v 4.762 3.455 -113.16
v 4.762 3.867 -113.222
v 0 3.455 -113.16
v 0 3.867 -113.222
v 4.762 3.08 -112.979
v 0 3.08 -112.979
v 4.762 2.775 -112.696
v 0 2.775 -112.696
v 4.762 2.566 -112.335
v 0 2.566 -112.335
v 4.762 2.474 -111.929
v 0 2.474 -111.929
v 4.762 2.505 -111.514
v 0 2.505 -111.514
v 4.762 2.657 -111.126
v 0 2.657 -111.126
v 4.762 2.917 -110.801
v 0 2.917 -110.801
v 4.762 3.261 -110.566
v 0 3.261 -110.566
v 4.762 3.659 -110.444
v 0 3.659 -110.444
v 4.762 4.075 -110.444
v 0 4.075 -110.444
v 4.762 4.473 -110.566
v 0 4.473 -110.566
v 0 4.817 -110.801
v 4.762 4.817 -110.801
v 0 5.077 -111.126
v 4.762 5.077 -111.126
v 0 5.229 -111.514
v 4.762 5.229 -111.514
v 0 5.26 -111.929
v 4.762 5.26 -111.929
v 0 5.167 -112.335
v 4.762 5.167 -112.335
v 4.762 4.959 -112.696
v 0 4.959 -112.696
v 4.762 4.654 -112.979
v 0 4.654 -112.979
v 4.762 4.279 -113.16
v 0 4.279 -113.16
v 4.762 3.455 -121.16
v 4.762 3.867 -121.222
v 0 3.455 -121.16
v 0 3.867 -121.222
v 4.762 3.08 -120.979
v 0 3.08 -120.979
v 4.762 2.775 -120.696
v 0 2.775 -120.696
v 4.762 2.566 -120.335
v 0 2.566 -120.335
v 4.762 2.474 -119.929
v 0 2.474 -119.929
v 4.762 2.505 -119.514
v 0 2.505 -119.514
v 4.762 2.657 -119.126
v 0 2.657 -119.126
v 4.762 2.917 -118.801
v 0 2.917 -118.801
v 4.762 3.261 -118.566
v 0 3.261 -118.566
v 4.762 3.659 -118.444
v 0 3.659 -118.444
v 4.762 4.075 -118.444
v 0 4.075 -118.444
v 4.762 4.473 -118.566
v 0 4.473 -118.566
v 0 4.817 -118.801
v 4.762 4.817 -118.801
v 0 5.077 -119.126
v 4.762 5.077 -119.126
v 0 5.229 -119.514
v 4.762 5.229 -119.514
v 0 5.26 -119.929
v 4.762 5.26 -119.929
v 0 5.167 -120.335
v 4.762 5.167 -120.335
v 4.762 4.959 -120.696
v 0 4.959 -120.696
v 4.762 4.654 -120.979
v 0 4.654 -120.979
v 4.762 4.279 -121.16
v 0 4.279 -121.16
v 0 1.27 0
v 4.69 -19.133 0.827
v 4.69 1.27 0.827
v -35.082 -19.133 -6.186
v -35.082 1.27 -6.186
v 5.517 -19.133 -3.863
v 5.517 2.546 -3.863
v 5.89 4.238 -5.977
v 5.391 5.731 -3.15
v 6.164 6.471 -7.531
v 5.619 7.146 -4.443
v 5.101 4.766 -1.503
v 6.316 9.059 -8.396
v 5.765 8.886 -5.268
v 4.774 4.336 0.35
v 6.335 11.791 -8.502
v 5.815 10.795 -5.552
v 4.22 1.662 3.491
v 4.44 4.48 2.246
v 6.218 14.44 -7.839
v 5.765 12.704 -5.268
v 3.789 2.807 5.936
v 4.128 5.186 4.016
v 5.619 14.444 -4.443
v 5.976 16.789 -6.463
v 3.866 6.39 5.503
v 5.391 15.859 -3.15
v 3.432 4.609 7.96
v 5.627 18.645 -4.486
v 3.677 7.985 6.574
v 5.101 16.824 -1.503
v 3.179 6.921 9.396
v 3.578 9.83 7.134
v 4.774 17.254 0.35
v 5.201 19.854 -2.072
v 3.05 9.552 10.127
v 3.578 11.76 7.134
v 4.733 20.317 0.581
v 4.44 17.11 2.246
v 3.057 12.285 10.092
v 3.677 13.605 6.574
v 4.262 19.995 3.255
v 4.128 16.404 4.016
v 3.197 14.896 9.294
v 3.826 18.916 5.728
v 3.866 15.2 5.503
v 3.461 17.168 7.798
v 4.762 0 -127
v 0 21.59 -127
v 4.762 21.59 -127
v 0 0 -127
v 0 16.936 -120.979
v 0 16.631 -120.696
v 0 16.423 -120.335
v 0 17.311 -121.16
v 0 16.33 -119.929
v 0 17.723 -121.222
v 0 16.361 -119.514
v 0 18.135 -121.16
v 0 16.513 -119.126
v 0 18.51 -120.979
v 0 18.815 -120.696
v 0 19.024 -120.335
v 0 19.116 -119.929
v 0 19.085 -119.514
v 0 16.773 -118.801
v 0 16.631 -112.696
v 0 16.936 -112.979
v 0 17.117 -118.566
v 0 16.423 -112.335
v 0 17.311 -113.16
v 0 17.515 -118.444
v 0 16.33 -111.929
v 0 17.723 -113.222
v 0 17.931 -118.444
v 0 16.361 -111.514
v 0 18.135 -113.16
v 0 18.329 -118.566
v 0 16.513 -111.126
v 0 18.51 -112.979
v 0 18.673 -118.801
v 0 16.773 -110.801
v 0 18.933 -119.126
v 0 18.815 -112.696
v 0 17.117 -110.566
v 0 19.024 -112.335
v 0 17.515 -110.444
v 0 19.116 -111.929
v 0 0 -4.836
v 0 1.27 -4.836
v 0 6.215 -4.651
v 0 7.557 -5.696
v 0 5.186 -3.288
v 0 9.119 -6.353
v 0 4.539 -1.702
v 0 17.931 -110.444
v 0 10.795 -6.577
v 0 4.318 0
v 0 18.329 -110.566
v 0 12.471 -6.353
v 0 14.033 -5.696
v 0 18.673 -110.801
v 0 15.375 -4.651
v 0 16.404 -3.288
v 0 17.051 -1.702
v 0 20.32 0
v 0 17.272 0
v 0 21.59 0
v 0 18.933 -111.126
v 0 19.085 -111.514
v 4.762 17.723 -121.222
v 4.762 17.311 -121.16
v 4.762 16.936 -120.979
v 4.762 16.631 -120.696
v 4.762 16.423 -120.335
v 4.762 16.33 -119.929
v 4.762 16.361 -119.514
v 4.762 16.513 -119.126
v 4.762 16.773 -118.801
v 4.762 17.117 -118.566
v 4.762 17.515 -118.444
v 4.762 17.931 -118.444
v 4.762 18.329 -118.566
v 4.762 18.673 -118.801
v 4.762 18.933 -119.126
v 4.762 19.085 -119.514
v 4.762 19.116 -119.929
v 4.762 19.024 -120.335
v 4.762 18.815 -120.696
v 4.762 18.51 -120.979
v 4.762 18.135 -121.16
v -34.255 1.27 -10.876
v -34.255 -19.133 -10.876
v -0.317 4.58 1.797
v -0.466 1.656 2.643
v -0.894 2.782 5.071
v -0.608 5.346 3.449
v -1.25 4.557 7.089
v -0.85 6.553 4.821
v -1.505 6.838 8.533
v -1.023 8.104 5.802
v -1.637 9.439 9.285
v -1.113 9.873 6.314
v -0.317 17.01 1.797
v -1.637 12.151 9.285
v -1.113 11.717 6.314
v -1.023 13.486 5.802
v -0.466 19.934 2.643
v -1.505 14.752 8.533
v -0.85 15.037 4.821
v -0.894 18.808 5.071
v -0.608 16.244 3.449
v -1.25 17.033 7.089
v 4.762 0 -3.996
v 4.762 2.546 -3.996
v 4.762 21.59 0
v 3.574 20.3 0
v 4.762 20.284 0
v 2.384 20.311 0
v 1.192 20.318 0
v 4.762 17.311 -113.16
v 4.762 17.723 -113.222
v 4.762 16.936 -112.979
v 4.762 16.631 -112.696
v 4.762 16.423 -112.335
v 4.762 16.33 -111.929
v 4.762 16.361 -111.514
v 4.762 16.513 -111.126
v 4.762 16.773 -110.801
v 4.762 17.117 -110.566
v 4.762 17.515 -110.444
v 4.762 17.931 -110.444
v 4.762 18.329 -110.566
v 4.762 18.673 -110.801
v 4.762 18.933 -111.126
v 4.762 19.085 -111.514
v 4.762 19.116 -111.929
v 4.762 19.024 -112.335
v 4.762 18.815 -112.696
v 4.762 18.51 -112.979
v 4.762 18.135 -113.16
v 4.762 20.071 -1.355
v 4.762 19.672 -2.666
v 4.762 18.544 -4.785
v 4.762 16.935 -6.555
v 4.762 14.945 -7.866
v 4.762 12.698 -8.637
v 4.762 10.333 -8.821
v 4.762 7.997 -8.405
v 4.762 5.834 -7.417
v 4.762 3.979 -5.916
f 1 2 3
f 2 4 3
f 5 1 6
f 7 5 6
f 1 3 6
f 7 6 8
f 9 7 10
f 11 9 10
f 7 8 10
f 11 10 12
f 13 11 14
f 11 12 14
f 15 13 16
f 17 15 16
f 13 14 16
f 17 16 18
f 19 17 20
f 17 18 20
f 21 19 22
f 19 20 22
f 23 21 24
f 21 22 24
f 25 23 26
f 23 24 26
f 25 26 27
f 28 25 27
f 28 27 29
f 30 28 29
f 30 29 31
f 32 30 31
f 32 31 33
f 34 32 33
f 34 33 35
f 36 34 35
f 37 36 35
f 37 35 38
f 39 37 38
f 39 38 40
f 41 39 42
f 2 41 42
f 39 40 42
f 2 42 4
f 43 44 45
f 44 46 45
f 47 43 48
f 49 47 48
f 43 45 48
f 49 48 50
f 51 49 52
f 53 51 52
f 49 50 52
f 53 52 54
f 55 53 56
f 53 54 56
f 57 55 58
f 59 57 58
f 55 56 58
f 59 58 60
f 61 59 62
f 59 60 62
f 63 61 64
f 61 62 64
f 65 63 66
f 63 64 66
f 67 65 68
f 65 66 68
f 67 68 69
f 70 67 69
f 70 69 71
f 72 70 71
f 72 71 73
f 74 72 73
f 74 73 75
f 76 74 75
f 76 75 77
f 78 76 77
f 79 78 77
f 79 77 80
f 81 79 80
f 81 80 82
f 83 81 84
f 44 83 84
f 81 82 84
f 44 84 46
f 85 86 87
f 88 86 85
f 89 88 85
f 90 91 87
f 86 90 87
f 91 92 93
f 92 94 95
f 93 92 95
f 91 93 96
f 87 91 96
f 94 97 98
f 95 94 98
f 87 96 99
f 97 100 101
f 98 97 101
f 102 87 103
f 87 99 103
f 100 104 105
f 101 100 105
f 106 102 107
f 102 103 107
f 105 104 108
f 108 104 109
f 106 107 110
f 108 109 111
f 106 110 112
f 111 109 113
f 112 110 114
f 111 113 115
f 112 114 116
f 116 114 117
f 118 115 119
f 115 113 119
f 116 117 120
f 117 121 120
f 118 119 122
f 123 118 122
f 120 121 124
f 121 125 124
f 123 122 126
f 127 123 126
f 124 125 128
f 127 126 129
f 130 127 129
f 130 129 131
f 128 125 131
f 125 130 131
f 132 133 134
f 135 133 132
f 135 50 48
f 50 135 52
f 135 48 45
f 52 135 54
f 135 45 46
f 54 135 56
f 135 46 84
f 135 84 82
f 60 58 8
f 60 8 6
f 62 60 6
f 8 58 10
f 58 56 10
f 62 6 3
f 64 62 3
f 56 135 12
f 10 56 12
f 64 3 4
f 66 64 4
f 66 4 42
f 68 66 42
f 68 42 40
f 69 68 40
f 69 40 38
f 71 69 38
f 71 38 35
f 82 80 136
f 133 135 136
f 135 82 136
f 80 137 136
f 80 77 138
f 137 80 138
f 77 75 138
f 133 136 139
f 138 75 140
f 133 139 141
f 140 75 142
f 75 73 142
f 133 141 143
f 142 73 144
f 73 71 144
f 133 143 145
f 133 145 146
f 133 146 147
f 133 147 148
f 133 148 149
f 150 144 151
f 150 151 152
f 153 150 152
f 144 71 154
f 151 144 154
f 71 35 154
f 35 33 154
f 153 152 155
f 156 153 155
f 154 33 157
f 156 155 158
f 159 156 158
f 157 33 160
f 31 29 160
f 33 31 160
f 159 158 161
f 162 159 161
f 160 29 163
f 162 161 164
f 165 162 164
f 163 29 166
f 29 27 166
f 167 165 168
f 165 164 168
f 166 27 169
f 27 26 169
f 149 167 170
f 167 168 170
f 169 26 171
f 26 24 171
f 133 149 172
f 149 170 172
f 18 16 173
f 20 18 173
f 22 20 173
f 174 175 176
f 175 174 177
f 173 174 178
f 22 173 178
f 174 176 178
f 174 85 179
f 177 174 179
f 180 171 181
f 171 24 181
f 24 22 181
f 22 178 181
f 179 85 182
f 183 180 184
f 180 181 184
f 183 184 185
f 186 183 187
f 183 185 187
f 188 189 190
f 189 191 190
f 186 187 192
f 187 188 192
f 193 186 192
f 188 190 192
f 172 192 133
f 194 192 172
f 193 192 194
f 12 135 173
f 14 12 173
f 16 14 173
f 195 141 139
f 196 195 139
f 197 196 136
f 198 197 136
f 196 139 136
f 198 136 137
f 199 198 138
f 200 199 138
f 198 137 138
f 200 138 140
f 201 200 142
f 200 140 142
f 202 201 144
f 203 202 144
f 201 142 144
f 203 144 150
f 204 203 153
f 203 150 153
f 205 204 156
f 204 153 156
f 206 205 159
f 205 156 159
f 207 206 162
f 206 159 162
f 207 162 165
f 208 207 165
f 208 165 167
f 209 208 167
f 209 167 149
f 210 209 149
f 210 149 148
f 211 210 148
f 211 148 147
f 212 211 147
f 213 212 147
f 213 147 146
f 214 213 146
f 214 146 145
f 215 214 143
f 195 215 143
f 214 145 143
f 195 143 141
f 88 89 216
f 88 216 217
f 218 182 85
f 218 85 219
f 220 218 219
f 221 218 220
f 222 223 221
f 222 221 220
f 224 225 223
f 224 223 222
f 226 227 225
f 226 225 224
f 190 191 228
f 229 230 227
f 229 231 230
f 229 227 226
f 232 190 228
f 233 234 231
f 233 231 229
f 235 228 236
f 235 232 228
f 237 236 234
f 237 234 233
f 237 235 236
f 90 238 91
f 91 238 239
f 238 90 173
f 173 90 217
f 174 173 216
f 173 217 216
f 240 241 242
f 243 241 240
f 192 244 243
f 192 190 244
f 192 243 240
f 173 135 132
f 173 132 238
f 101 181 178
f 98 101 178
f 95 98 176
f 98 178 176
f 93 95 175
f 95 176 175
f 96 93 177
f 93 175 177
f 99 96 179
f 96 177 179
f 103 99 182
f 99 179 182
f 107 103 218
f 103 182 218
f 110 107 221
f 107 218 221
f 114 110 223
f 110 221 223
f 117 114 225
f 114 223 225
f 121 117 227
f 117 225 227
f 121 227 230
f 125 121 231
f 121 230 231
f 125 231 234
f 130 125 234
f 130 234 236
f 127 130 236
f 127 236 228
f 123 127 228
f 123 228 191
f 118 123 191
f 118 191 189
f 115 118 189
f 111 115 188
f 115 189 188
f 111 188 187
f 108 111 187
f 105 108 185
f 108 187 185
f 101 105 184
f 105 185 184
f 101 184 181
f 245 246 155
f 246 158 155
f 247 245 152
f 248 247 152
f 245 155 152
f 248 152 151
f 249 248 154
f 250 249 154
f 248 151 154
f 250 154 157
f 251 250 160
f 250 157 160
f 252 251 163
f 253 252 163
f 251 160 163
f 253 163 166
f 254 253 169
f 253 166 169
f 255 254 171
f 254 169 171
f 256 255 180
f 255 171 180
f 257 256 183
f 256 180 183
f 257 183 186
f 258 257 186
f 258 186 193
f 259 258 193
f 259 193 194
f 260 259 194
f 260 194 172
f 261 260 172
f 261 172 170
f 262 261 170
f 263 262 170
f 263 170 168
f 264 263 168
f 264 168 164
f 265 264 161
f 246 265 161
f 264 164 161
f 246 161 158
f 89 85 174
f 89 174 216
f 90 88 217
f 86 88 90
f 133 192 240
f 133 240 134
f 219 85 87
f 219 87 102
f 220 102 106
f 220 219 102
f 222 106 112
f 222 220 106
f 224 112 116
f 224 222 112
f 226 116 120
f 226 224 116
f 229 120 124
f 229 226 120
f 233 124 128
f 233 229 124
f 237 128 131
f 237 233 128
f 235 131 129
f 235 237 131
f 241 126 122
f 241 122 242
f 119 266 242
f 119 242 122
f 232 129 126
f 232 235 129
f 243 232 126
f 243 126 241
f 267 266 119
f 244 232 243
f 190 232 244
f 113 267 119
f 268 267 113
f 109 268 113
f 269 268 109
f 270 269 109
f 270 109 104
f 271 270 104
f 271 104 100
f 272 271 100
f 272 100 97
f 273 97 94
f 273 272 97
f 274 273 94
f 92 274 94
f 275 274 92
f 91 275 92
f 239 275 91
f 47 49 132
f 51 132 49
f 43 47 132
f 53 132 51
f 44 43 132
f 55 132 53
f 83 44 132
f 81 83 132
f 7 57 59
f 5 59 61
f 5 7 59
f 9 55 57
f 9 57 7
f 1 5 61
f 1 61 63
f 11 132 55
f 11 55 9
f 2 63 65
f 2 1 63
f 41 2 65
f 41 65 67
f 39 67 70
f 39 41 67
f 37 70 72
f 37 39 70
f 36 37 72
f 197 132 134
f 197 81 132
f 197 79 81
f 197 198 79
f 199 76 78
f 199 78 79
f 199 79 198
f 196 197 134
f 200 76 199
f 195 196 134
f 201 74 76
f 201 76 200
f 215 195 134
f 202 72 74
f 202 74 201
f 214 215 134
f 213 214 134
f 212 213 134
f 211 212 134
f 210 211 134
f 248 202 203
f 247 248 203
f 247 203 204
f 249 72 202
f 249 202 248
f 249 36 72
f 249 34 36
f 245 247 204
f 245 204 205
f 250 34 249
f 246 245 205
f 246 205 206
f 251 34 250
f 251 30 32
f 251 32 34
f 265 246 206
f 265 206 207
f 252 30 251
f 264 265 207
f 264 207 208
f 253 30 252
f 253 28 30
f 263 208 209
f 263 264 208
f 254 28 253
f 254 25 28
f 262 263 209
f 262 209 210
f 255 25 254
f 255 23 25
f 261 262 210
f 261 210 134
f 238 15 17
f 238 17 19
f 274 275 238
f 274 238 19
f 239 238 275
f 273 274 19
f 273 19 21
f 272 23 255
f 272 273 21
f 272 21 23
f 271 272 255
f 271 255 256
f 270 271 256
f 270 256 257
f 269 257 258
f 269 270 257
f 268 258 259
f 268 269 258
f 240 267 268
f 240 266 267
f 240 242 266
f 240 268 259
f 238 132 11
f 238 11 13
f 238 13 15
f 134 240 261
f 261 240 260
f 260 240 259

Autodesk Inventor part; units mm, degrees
ref_plane "YZ Plane" through (0, 0, 0) normal (1, 0, 0) x (0, 1, 0)
ref_plane "XZ Plane" through (0, 0, 0) normal (0, 1, 0) x (-1, 0, 0)
ref_plane "XY Plane" through (0, 0, 0) normal (0, 0, 1) x (1, 0, 0)
sketch "Sketch1" plane through (0, 0, 0) normal (1, 0, 0) x (0, 1, 0)
  line L0 (0, 0) -> (21.59, 0)
  line L1 (21.59, 0) -> (21.59, -127)
  line L2 (21.59, -127) -> (0, -127)
  line L3 (0, -127) -> (0, 0)
  dimension "d0" = 21.59
  dimension "d1" = 127
extrude "Extrusion1" add sketch "Sketch1" along normal blind 4.7625
sketch "Sketch2" plane through (0, 21.59, 0) normal (0, 1, 0) x (1, 0, 0)
  line L0 (0, 0) -> (-3.2071, -18.1884)
  line L1 (0, 0) -> (18.469, 0) construction
  line L2 (0, 0) -> (13.0579, -2.3025)
  line L3 (0, 0) -> (13.2594, 0) construction
  dimension "d4" = 100
  dimension "d24" = 10
ref_plane "Work Plane1" through (0, 21.59, 0) normal (-0.9848078, 0, -0.1736482) x (-0.1736482, 0, 0.9848078)
sketch "Sketch3" plane through (0, 21.59, 0) normal (-0.9848078, 0, -0.1736482) x (-0.1736482, 0, 0.9848078)
  line L0 (-0.827, 0) -> (-0.827, -21.59) projected
  line L1 (-0.827, -21.59) -> (-125.8976, -21.59) projected
  line L2 (-125.8976, -21.59) -> (-125.8976, 0) projected
  line L3 (-125.8976, 0) -> (-0.827, 0) projected
  line L4 (0, -21.59) -> (0, 0) projected
  line L5 (0, -21.59) -> (-0.827, -21.59) projected
  line L6 (-0.827, 0) -> (-0.827, -21.59) projected
  line L7 (0, 0) -> (-0.827, 0) projected
  line L8 (0, -21.59) -> (0, 0) projected
  circle A0 centre (0, -10.795) radius 9.525
  dimension "d5" = 19.05
  dimension "d6" = 21.59
  dimension "d7" = 10.795
extrude "Extrusion2" add sketch "Sketch3" against normal blind 4.7625 contours A0 L4 L0 | L0 A0 | A0 L4
sketch "Sketch5" plane through (4.6901, 10.795, 0.827) normal (0.9848078, 0, 0.1736482) x (0.1736482, 0, -0.9848078)
  circle A0 centre (0, 0) radius 9.525 projected
  point P0 (0, -10.795)
hole "Hole2" at (4.6901, 10.795, 0.827) direction (-0.9848078, 0, -0.1736482) diameter 12.954 end through all
ref_plane "Work Plane3" through (0, 0, 0) normal (-0.1736482, 0, 0.9848078) x (0, 1, 0)
sketch "Sketch9" plane through (4.7625, 0, 0) normal (1, 0, 0) x (0, 0, -1)
  line L0 (0, 0) -> (127, 0) projected
  line L1 (127, 0) -> (127, 21.59) projected
  line L2 (127, 21.59) -> (0, 21.59) projected
  line L3 (0, 21.59) -> (0, 20.284) projected
  ellipse E0 centre (-0.8398, 10.795) end of major axis (8.8322, 10.795) minor radius 9.525 (0, 1.306) -> (0, 20.284) ccw projected
  circle A0 centre (115.825, 10.795) radius 8
  line L4 (111.825, 17.7232) -> (119.825, 17.7232)
  line L5 (119.825, 17.7232) -> (119.825, 3.8668)
  line L6 (119.825, 3.8668) -> (111.825, 3.8668)
  line L7 (111.825, 3.8668) -> (111.825, 17.7232)
  line L8 (0, 1.306) -> (0, 0) projected
  dimension "d34" = 16
  dimension "d35" = 8
  dimension "d36" = 4
  dimension "d37" = 21.59
  dimension "d38" = 10.795
  dimension "d39" = 11.175
hole "Hole3" at (4.7625, 17.7232, -111.825) at (4.7625, 17.7232, -119.825) at (4.7625, 3.8668, -119.825) at (4.7625, 3.8668, -111.825) direction (-1, 0, 0) diameter 2.794 end through all
sketch "Sketch10" plane through (0, 0, 0) normal (-0.1736482, 0, 0.9848078) x (0, 1, 0)
  ellipse E0 centre (10.795, 0) end of major axis (10.795, -54.019) minor radius 9.525 (20.284, -4.6901) -> (1.27, 0) ccw projected
  line L0 (1.27, 0) -> (20.32, 0) projected
  ellipse E1 centre (10.795, 0) end of major axis (10.795, -54.019) minor radius 9.525 (20.32, 0) -> (1.306, -4.6901) ccw projected
  ellipse E2 centre (10.795, -4.836) end of major axis (1.27, -4.836) minor radius 1.6795 (20.284, -4.6901) -> (1.306, -4.6901) ccw projected
  line L1 (1.27, -4.7625) -> (20.32, -4.7625) projected
  ellipse E3 centre (3.8668, 20.8074) end of major axis (5.2638, 20.8074) minor radius 0.2426 projected
  ellipse E4 centre (17.7232, 19.4182) end of major axis (19.1202, 19.4182) minor radius 0.2426 projected
  ellipse E5 centre (17.7232, 20.8074) end of major axis (19.1202, 20.8074) minor radius 0.2426 projected
  ellipse E6 centre (3.8668, 19.4182) end of major axis (5.2638, 19.4182) minor radius 0.2426 projected
  ellipse E7 centre (10.795, 0) end of major axis (17.272, 0) minor radius 1.1421 (17.272, 0) -> (4.318, 0) ccw projected
  line L2 (17.272, 0) -> (20.32, 0) projected
  line L3 (20.32, 0) -> (21.59, 0) projected
  line L4 (21.59, 0) -> (21.59, 22.0533) projected
  line L5 (21.59, 22.0533) -> (0, 22.0533) projected
  line L6 (0, 22.0533) -> (0, 0) projected
  line L7 (0, 0) -> (1.27, 0) projected
  line L8 (1.27, 0) -> (4.318, 0) projected
  line L9 (20.32, 0) -> (1.27, 0) projected
  line L10 (3.0923, 0) -> (1.27, 0)
  line L11 (-19.1327, 0) -> (-19.1327, -4.7625)
  line L12 (-19.1327, -4.7625) -> (3.0923, -4.7625)
  line L13 (3.0923, -4.7625) -> (3.0923, 0)
  line L14 (-19.1327, -4.7625) -> (1.27, -4.7625)
  line L15 (1.27, 0) -> (1.27, 35.6235)
  line L16 (1.27, 35.6235) -> (-19.1327, 35.6235)
  line L17 (-19.1327, 35.6235) -> (-19.1327, -4.7625)
  dimension "d47" = 22.225
  dimension "d50" = 20.4027
  dimension "d53" = 4.7625
  dimension "d54" = 40.386
extrude "Extrusion4" add sketch "Sketch10" against normal blind 4.7625 contours L13 L1 L12 L11 L17 L16 L15 L5 L6 L7 E1 E2 | E2 E1 L0 L13 | L7 L6 L5 L15
equation "\"d7\" = 0.5 * d6"
equation "\"d36\" = 0.5 * d35"
equation "\"d38\" = 0.5 * d37"
properties part number "WheelIntakeMotorMount2.0"
